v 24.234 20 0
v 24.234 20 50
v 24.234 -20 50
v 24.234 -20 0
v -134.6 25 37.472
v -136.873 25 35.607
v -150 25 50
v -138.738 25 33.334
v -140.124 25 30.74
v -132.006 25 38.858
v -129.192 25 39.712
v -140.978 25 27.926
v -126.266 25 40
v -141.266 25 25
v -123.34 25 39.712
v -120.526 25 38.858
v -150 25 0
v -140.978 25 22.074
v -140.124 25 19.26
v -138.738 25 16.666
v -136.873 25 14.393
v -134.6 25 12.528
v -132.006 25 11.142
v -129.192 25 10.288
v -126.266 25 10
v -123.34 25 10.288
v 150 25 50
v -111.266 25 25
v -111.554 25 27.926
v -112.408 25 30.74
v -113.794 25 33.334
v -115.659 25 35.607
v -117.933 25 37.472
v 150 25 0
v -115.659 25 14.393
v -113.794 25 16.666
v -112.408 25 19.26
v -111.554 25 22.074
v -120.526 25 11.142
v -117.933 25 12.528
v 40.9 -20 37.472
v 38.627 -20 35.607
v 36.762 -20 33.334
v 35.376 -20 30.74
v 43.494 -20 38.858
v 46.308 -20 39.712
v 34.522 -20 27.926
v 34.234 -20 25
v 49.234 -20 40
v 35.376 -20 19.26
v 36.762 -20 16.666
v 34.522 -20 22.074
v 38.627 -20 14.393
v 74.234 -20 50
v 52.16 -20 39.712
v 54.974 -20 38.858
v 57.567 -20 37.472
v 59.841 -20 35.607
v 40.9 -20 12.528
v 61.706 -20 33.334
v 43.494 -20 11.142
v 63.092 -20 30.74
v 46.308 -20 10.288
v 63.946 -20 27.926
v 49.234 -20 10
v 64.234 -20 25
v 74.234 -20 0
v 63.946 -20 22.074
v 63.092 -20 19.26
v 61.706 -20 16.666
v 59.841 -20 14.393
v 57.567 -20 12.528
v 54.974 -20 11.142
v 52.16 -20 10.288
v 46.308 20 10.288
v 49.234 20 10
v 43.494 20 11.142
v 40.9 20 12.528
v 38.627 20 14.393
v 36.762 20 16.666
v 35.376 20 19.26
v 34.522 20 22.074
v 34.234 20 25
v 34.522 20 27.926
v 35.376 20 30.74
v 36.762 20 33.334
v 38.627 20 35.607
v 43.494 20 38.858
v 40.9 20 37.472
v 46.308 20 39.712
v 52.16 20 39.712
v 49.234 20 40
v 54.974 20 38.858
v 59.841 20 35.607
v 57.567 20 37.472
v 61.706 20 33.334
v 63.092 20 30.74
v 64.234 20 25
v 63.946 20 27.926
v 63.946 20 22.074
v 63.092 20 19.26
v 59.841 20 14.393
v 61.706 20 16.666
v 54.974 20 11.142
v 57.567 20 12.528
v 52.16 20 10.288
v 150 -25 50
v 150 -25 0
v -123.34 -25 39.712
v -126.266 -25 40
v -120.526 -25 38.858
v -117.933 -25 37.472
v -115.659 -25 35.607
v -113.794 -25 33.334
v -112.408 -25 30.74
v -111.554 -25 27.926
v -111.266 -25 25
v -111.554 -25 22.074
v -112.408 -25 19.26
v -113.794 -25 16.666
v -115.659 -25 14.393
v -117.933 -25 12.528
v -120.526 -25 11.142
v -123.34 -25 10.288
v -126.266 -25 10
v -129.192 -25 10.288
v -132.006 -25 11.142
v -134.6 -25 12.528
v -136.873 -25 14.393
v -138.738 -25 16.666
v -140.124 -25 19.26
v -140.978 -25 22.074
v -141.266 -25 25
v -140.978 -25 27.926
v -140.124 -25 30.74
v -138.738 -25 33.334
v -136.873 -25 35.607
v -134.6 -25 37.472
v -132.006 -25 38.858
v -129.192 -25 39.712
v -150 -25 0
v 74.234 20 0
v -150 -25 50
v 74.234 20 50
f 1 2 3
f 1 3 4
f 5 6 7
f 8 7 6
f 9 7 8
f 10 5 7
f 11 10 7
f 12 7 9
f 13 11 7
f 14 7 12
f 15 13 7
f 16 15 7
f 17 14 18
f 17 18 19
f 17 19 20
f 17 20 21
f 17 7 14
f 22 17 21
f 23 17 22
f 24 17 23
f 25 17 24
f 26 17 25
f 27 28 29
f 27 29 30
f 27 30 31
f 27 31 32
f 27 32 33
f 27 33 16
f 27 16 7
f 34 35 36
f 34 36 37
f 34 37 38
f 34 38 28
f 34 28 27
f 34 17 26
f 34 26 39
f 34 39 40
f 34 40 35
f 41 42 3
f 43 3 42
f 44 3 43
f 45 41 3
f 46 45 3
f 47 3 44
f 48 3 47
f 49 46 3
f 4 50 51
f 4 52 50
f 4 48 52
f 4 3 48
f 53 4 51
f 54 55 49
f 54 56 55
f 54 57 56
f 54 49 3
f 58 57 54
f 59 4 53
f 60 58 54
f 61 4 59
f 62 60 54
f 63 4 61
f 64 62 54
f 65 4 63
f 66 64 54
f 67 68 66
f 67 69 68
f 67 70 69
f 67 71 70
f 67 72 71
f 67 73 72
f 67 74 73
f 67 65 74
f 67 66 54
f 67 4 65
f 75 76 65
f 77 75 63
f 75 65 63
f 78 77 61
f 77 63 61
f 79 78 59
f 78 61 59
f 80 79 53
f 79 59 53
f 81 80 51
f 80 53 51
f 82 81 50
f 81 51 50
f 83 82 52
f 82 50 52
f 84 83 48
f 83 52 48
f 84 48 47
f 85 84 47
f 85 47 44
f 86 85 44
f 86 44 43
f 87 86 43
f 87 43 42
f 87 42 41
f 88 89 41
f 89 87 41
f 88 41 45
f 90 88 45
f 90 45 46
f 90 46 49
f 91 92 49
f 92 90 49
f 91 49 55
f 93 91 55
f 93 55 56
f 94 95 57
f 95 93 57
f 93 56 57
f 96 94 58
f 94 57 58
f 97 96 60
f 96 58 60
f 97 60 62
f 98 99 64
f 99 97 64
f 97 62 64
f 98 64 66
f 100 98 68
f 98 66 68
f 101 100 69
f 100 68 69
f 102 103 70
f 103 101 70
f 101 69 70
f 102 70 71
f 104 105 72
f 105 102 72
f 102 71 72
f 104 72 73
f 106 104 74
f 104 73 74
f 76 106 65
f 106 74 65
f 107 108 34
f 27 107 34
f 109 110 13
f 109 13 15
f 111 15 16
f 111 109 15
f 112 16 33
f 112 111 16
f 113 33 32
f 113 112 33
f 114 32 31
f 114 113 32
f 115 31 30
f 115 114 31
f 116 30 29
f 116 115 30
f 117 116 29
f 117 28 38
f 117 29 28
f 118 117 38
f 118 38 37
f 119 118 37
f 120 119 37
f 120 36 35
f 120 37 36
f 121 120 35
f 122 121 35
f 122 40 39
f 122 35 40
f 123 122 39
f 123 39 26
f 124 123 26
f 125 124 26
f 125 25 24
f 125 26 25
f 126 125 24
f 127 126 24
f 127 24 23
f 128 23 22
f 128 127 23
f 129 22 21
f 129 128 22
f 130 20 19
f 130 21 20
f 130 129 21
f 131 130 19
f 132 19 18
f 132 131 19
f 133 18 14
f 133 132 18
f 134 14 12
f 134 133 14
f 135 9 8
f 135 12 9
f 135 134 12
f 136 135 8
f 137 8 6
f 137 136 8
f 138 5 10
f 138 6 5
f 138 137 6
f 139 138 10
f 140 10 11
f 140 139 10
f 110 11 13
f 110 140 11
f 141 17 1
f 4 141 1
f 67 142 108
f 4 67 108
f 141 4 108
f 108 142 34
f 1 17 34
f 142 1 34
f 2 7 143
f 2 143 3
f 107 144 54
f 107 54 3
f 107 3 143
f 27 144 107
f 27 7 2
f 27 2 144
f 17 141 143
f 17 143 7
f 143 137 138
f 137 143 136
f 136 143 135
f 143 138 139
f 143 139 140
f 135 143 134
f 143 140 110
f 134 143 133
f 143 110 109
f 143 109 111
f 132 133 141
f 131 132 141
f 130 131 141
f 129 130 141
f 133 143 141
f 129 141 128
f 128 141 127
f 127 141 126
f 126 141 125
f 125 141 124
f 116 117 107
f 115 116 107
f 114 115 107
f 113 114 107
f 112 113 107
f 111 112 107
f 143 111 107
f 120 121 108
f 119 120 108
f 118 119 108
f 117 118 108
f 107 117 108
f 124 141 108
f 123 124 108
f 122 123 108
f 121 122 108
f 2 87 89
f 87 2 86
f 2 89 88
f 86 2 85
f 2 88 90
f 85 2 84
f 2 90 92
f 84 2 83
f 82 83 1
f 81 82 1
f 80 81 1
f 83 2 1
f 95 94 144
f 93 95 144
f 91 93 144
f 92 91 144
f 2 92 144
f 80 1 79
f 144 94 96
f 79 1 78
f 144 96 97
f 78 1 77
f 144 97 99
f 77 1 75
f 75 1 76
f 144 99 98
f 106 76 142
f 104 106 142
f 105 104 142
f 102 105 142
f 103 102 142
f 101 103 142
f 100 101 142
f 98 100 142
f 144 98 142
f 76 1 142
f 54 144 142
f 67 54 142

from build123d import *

# Parameters (mm, degrees)
SKETCH1_W               = 300
SKETCH1_H               = 50
BOSS_EXTRUDE1_DEPTH     = 50
CUT_EXTRUDE1_DEPTH      = 166.831239518
CUT_EXTRUDE1_DEPTH_BACK = 166.831239518
SKETCH2_R               = 15
CUT_EXTRUDE2_START      = -5
SKETCH3_W               = 50
SKETCH3_H               = 50
CUT_EXTRUDE2_DEPTH      = 40
BOSS_EXTRUDE2_REACH     = 166.393
SKETCH4_R               = 15


with BuildPart() as part:
    # Sketch1 → Boss-Extrude1 (new body)
    with BuildSketch(Plane.XY):
        Rectangle(SKETCH1_W, SKETCH1_H)
    extrude(amount=BOSS_EXTRUDE1_DEPTH)

    # Sketch2 → Cut-Extrude1 (cut, two sides: drawn at the far end of the back side and taken through both)
    with BuildSketch(Plane(origin=(0, 25, 0), x_dir=(1, 0, 0), z_dir=(0, 1, 0)).offset(-CUT_EXTRUDE1_DEPTH_BACK)):
        with Locations(Location((-126.266078419, -25, 0), (0, 0, 270))):
            Circle(SKETCH2_R)
    extrude(amount=CUT_EXTRUDE1_DEPTH + CUT_EXTRUDE1_DEPTH_BACK, mode=Mode.SUBTRACT)

    # Sketch3 → Cut-Extrude2 (cut)
    with BuildSketch(Plane(origin=(0, 25, 0), x_dir=(1, 0, 0), z_dir=(0, 1, 0)).offset(CUT_EXTRUDE2_START)):
        with Locations((49.233921581, -25)):
            Rectangle(SKETCH3_W, SKETCH3_H)
    extrude(amount=-CUT_EXTRUDE2_DEPTH, mode=Mode.SUBTRACT)

    # Sketch4 → Boss-Extrude2 (add, up to next)
    with BuildSketch(Plane(origin=(0, -20, 0), x_dir=(1, 0, 0), z_dir=(0, 1, 0)), mode=Mode.PRIVATE) as boss_extrude2_sk1:
        with Locations(Location((49.233921581, -25, 0), (0, 0, 90))):
            Circle(SKETCH4_R)
    boss_extrude2_tool1 = extrude(boss_extrude2_sk1.sketch, amount=BOSS_EXTRUDE2_REACH, mode=Mode.PRIVATE) - part.part
    add(boss_extrude2_tool1.solids().sort_by_distance((49.233922, -20, 25))[0])


solid = part.part
